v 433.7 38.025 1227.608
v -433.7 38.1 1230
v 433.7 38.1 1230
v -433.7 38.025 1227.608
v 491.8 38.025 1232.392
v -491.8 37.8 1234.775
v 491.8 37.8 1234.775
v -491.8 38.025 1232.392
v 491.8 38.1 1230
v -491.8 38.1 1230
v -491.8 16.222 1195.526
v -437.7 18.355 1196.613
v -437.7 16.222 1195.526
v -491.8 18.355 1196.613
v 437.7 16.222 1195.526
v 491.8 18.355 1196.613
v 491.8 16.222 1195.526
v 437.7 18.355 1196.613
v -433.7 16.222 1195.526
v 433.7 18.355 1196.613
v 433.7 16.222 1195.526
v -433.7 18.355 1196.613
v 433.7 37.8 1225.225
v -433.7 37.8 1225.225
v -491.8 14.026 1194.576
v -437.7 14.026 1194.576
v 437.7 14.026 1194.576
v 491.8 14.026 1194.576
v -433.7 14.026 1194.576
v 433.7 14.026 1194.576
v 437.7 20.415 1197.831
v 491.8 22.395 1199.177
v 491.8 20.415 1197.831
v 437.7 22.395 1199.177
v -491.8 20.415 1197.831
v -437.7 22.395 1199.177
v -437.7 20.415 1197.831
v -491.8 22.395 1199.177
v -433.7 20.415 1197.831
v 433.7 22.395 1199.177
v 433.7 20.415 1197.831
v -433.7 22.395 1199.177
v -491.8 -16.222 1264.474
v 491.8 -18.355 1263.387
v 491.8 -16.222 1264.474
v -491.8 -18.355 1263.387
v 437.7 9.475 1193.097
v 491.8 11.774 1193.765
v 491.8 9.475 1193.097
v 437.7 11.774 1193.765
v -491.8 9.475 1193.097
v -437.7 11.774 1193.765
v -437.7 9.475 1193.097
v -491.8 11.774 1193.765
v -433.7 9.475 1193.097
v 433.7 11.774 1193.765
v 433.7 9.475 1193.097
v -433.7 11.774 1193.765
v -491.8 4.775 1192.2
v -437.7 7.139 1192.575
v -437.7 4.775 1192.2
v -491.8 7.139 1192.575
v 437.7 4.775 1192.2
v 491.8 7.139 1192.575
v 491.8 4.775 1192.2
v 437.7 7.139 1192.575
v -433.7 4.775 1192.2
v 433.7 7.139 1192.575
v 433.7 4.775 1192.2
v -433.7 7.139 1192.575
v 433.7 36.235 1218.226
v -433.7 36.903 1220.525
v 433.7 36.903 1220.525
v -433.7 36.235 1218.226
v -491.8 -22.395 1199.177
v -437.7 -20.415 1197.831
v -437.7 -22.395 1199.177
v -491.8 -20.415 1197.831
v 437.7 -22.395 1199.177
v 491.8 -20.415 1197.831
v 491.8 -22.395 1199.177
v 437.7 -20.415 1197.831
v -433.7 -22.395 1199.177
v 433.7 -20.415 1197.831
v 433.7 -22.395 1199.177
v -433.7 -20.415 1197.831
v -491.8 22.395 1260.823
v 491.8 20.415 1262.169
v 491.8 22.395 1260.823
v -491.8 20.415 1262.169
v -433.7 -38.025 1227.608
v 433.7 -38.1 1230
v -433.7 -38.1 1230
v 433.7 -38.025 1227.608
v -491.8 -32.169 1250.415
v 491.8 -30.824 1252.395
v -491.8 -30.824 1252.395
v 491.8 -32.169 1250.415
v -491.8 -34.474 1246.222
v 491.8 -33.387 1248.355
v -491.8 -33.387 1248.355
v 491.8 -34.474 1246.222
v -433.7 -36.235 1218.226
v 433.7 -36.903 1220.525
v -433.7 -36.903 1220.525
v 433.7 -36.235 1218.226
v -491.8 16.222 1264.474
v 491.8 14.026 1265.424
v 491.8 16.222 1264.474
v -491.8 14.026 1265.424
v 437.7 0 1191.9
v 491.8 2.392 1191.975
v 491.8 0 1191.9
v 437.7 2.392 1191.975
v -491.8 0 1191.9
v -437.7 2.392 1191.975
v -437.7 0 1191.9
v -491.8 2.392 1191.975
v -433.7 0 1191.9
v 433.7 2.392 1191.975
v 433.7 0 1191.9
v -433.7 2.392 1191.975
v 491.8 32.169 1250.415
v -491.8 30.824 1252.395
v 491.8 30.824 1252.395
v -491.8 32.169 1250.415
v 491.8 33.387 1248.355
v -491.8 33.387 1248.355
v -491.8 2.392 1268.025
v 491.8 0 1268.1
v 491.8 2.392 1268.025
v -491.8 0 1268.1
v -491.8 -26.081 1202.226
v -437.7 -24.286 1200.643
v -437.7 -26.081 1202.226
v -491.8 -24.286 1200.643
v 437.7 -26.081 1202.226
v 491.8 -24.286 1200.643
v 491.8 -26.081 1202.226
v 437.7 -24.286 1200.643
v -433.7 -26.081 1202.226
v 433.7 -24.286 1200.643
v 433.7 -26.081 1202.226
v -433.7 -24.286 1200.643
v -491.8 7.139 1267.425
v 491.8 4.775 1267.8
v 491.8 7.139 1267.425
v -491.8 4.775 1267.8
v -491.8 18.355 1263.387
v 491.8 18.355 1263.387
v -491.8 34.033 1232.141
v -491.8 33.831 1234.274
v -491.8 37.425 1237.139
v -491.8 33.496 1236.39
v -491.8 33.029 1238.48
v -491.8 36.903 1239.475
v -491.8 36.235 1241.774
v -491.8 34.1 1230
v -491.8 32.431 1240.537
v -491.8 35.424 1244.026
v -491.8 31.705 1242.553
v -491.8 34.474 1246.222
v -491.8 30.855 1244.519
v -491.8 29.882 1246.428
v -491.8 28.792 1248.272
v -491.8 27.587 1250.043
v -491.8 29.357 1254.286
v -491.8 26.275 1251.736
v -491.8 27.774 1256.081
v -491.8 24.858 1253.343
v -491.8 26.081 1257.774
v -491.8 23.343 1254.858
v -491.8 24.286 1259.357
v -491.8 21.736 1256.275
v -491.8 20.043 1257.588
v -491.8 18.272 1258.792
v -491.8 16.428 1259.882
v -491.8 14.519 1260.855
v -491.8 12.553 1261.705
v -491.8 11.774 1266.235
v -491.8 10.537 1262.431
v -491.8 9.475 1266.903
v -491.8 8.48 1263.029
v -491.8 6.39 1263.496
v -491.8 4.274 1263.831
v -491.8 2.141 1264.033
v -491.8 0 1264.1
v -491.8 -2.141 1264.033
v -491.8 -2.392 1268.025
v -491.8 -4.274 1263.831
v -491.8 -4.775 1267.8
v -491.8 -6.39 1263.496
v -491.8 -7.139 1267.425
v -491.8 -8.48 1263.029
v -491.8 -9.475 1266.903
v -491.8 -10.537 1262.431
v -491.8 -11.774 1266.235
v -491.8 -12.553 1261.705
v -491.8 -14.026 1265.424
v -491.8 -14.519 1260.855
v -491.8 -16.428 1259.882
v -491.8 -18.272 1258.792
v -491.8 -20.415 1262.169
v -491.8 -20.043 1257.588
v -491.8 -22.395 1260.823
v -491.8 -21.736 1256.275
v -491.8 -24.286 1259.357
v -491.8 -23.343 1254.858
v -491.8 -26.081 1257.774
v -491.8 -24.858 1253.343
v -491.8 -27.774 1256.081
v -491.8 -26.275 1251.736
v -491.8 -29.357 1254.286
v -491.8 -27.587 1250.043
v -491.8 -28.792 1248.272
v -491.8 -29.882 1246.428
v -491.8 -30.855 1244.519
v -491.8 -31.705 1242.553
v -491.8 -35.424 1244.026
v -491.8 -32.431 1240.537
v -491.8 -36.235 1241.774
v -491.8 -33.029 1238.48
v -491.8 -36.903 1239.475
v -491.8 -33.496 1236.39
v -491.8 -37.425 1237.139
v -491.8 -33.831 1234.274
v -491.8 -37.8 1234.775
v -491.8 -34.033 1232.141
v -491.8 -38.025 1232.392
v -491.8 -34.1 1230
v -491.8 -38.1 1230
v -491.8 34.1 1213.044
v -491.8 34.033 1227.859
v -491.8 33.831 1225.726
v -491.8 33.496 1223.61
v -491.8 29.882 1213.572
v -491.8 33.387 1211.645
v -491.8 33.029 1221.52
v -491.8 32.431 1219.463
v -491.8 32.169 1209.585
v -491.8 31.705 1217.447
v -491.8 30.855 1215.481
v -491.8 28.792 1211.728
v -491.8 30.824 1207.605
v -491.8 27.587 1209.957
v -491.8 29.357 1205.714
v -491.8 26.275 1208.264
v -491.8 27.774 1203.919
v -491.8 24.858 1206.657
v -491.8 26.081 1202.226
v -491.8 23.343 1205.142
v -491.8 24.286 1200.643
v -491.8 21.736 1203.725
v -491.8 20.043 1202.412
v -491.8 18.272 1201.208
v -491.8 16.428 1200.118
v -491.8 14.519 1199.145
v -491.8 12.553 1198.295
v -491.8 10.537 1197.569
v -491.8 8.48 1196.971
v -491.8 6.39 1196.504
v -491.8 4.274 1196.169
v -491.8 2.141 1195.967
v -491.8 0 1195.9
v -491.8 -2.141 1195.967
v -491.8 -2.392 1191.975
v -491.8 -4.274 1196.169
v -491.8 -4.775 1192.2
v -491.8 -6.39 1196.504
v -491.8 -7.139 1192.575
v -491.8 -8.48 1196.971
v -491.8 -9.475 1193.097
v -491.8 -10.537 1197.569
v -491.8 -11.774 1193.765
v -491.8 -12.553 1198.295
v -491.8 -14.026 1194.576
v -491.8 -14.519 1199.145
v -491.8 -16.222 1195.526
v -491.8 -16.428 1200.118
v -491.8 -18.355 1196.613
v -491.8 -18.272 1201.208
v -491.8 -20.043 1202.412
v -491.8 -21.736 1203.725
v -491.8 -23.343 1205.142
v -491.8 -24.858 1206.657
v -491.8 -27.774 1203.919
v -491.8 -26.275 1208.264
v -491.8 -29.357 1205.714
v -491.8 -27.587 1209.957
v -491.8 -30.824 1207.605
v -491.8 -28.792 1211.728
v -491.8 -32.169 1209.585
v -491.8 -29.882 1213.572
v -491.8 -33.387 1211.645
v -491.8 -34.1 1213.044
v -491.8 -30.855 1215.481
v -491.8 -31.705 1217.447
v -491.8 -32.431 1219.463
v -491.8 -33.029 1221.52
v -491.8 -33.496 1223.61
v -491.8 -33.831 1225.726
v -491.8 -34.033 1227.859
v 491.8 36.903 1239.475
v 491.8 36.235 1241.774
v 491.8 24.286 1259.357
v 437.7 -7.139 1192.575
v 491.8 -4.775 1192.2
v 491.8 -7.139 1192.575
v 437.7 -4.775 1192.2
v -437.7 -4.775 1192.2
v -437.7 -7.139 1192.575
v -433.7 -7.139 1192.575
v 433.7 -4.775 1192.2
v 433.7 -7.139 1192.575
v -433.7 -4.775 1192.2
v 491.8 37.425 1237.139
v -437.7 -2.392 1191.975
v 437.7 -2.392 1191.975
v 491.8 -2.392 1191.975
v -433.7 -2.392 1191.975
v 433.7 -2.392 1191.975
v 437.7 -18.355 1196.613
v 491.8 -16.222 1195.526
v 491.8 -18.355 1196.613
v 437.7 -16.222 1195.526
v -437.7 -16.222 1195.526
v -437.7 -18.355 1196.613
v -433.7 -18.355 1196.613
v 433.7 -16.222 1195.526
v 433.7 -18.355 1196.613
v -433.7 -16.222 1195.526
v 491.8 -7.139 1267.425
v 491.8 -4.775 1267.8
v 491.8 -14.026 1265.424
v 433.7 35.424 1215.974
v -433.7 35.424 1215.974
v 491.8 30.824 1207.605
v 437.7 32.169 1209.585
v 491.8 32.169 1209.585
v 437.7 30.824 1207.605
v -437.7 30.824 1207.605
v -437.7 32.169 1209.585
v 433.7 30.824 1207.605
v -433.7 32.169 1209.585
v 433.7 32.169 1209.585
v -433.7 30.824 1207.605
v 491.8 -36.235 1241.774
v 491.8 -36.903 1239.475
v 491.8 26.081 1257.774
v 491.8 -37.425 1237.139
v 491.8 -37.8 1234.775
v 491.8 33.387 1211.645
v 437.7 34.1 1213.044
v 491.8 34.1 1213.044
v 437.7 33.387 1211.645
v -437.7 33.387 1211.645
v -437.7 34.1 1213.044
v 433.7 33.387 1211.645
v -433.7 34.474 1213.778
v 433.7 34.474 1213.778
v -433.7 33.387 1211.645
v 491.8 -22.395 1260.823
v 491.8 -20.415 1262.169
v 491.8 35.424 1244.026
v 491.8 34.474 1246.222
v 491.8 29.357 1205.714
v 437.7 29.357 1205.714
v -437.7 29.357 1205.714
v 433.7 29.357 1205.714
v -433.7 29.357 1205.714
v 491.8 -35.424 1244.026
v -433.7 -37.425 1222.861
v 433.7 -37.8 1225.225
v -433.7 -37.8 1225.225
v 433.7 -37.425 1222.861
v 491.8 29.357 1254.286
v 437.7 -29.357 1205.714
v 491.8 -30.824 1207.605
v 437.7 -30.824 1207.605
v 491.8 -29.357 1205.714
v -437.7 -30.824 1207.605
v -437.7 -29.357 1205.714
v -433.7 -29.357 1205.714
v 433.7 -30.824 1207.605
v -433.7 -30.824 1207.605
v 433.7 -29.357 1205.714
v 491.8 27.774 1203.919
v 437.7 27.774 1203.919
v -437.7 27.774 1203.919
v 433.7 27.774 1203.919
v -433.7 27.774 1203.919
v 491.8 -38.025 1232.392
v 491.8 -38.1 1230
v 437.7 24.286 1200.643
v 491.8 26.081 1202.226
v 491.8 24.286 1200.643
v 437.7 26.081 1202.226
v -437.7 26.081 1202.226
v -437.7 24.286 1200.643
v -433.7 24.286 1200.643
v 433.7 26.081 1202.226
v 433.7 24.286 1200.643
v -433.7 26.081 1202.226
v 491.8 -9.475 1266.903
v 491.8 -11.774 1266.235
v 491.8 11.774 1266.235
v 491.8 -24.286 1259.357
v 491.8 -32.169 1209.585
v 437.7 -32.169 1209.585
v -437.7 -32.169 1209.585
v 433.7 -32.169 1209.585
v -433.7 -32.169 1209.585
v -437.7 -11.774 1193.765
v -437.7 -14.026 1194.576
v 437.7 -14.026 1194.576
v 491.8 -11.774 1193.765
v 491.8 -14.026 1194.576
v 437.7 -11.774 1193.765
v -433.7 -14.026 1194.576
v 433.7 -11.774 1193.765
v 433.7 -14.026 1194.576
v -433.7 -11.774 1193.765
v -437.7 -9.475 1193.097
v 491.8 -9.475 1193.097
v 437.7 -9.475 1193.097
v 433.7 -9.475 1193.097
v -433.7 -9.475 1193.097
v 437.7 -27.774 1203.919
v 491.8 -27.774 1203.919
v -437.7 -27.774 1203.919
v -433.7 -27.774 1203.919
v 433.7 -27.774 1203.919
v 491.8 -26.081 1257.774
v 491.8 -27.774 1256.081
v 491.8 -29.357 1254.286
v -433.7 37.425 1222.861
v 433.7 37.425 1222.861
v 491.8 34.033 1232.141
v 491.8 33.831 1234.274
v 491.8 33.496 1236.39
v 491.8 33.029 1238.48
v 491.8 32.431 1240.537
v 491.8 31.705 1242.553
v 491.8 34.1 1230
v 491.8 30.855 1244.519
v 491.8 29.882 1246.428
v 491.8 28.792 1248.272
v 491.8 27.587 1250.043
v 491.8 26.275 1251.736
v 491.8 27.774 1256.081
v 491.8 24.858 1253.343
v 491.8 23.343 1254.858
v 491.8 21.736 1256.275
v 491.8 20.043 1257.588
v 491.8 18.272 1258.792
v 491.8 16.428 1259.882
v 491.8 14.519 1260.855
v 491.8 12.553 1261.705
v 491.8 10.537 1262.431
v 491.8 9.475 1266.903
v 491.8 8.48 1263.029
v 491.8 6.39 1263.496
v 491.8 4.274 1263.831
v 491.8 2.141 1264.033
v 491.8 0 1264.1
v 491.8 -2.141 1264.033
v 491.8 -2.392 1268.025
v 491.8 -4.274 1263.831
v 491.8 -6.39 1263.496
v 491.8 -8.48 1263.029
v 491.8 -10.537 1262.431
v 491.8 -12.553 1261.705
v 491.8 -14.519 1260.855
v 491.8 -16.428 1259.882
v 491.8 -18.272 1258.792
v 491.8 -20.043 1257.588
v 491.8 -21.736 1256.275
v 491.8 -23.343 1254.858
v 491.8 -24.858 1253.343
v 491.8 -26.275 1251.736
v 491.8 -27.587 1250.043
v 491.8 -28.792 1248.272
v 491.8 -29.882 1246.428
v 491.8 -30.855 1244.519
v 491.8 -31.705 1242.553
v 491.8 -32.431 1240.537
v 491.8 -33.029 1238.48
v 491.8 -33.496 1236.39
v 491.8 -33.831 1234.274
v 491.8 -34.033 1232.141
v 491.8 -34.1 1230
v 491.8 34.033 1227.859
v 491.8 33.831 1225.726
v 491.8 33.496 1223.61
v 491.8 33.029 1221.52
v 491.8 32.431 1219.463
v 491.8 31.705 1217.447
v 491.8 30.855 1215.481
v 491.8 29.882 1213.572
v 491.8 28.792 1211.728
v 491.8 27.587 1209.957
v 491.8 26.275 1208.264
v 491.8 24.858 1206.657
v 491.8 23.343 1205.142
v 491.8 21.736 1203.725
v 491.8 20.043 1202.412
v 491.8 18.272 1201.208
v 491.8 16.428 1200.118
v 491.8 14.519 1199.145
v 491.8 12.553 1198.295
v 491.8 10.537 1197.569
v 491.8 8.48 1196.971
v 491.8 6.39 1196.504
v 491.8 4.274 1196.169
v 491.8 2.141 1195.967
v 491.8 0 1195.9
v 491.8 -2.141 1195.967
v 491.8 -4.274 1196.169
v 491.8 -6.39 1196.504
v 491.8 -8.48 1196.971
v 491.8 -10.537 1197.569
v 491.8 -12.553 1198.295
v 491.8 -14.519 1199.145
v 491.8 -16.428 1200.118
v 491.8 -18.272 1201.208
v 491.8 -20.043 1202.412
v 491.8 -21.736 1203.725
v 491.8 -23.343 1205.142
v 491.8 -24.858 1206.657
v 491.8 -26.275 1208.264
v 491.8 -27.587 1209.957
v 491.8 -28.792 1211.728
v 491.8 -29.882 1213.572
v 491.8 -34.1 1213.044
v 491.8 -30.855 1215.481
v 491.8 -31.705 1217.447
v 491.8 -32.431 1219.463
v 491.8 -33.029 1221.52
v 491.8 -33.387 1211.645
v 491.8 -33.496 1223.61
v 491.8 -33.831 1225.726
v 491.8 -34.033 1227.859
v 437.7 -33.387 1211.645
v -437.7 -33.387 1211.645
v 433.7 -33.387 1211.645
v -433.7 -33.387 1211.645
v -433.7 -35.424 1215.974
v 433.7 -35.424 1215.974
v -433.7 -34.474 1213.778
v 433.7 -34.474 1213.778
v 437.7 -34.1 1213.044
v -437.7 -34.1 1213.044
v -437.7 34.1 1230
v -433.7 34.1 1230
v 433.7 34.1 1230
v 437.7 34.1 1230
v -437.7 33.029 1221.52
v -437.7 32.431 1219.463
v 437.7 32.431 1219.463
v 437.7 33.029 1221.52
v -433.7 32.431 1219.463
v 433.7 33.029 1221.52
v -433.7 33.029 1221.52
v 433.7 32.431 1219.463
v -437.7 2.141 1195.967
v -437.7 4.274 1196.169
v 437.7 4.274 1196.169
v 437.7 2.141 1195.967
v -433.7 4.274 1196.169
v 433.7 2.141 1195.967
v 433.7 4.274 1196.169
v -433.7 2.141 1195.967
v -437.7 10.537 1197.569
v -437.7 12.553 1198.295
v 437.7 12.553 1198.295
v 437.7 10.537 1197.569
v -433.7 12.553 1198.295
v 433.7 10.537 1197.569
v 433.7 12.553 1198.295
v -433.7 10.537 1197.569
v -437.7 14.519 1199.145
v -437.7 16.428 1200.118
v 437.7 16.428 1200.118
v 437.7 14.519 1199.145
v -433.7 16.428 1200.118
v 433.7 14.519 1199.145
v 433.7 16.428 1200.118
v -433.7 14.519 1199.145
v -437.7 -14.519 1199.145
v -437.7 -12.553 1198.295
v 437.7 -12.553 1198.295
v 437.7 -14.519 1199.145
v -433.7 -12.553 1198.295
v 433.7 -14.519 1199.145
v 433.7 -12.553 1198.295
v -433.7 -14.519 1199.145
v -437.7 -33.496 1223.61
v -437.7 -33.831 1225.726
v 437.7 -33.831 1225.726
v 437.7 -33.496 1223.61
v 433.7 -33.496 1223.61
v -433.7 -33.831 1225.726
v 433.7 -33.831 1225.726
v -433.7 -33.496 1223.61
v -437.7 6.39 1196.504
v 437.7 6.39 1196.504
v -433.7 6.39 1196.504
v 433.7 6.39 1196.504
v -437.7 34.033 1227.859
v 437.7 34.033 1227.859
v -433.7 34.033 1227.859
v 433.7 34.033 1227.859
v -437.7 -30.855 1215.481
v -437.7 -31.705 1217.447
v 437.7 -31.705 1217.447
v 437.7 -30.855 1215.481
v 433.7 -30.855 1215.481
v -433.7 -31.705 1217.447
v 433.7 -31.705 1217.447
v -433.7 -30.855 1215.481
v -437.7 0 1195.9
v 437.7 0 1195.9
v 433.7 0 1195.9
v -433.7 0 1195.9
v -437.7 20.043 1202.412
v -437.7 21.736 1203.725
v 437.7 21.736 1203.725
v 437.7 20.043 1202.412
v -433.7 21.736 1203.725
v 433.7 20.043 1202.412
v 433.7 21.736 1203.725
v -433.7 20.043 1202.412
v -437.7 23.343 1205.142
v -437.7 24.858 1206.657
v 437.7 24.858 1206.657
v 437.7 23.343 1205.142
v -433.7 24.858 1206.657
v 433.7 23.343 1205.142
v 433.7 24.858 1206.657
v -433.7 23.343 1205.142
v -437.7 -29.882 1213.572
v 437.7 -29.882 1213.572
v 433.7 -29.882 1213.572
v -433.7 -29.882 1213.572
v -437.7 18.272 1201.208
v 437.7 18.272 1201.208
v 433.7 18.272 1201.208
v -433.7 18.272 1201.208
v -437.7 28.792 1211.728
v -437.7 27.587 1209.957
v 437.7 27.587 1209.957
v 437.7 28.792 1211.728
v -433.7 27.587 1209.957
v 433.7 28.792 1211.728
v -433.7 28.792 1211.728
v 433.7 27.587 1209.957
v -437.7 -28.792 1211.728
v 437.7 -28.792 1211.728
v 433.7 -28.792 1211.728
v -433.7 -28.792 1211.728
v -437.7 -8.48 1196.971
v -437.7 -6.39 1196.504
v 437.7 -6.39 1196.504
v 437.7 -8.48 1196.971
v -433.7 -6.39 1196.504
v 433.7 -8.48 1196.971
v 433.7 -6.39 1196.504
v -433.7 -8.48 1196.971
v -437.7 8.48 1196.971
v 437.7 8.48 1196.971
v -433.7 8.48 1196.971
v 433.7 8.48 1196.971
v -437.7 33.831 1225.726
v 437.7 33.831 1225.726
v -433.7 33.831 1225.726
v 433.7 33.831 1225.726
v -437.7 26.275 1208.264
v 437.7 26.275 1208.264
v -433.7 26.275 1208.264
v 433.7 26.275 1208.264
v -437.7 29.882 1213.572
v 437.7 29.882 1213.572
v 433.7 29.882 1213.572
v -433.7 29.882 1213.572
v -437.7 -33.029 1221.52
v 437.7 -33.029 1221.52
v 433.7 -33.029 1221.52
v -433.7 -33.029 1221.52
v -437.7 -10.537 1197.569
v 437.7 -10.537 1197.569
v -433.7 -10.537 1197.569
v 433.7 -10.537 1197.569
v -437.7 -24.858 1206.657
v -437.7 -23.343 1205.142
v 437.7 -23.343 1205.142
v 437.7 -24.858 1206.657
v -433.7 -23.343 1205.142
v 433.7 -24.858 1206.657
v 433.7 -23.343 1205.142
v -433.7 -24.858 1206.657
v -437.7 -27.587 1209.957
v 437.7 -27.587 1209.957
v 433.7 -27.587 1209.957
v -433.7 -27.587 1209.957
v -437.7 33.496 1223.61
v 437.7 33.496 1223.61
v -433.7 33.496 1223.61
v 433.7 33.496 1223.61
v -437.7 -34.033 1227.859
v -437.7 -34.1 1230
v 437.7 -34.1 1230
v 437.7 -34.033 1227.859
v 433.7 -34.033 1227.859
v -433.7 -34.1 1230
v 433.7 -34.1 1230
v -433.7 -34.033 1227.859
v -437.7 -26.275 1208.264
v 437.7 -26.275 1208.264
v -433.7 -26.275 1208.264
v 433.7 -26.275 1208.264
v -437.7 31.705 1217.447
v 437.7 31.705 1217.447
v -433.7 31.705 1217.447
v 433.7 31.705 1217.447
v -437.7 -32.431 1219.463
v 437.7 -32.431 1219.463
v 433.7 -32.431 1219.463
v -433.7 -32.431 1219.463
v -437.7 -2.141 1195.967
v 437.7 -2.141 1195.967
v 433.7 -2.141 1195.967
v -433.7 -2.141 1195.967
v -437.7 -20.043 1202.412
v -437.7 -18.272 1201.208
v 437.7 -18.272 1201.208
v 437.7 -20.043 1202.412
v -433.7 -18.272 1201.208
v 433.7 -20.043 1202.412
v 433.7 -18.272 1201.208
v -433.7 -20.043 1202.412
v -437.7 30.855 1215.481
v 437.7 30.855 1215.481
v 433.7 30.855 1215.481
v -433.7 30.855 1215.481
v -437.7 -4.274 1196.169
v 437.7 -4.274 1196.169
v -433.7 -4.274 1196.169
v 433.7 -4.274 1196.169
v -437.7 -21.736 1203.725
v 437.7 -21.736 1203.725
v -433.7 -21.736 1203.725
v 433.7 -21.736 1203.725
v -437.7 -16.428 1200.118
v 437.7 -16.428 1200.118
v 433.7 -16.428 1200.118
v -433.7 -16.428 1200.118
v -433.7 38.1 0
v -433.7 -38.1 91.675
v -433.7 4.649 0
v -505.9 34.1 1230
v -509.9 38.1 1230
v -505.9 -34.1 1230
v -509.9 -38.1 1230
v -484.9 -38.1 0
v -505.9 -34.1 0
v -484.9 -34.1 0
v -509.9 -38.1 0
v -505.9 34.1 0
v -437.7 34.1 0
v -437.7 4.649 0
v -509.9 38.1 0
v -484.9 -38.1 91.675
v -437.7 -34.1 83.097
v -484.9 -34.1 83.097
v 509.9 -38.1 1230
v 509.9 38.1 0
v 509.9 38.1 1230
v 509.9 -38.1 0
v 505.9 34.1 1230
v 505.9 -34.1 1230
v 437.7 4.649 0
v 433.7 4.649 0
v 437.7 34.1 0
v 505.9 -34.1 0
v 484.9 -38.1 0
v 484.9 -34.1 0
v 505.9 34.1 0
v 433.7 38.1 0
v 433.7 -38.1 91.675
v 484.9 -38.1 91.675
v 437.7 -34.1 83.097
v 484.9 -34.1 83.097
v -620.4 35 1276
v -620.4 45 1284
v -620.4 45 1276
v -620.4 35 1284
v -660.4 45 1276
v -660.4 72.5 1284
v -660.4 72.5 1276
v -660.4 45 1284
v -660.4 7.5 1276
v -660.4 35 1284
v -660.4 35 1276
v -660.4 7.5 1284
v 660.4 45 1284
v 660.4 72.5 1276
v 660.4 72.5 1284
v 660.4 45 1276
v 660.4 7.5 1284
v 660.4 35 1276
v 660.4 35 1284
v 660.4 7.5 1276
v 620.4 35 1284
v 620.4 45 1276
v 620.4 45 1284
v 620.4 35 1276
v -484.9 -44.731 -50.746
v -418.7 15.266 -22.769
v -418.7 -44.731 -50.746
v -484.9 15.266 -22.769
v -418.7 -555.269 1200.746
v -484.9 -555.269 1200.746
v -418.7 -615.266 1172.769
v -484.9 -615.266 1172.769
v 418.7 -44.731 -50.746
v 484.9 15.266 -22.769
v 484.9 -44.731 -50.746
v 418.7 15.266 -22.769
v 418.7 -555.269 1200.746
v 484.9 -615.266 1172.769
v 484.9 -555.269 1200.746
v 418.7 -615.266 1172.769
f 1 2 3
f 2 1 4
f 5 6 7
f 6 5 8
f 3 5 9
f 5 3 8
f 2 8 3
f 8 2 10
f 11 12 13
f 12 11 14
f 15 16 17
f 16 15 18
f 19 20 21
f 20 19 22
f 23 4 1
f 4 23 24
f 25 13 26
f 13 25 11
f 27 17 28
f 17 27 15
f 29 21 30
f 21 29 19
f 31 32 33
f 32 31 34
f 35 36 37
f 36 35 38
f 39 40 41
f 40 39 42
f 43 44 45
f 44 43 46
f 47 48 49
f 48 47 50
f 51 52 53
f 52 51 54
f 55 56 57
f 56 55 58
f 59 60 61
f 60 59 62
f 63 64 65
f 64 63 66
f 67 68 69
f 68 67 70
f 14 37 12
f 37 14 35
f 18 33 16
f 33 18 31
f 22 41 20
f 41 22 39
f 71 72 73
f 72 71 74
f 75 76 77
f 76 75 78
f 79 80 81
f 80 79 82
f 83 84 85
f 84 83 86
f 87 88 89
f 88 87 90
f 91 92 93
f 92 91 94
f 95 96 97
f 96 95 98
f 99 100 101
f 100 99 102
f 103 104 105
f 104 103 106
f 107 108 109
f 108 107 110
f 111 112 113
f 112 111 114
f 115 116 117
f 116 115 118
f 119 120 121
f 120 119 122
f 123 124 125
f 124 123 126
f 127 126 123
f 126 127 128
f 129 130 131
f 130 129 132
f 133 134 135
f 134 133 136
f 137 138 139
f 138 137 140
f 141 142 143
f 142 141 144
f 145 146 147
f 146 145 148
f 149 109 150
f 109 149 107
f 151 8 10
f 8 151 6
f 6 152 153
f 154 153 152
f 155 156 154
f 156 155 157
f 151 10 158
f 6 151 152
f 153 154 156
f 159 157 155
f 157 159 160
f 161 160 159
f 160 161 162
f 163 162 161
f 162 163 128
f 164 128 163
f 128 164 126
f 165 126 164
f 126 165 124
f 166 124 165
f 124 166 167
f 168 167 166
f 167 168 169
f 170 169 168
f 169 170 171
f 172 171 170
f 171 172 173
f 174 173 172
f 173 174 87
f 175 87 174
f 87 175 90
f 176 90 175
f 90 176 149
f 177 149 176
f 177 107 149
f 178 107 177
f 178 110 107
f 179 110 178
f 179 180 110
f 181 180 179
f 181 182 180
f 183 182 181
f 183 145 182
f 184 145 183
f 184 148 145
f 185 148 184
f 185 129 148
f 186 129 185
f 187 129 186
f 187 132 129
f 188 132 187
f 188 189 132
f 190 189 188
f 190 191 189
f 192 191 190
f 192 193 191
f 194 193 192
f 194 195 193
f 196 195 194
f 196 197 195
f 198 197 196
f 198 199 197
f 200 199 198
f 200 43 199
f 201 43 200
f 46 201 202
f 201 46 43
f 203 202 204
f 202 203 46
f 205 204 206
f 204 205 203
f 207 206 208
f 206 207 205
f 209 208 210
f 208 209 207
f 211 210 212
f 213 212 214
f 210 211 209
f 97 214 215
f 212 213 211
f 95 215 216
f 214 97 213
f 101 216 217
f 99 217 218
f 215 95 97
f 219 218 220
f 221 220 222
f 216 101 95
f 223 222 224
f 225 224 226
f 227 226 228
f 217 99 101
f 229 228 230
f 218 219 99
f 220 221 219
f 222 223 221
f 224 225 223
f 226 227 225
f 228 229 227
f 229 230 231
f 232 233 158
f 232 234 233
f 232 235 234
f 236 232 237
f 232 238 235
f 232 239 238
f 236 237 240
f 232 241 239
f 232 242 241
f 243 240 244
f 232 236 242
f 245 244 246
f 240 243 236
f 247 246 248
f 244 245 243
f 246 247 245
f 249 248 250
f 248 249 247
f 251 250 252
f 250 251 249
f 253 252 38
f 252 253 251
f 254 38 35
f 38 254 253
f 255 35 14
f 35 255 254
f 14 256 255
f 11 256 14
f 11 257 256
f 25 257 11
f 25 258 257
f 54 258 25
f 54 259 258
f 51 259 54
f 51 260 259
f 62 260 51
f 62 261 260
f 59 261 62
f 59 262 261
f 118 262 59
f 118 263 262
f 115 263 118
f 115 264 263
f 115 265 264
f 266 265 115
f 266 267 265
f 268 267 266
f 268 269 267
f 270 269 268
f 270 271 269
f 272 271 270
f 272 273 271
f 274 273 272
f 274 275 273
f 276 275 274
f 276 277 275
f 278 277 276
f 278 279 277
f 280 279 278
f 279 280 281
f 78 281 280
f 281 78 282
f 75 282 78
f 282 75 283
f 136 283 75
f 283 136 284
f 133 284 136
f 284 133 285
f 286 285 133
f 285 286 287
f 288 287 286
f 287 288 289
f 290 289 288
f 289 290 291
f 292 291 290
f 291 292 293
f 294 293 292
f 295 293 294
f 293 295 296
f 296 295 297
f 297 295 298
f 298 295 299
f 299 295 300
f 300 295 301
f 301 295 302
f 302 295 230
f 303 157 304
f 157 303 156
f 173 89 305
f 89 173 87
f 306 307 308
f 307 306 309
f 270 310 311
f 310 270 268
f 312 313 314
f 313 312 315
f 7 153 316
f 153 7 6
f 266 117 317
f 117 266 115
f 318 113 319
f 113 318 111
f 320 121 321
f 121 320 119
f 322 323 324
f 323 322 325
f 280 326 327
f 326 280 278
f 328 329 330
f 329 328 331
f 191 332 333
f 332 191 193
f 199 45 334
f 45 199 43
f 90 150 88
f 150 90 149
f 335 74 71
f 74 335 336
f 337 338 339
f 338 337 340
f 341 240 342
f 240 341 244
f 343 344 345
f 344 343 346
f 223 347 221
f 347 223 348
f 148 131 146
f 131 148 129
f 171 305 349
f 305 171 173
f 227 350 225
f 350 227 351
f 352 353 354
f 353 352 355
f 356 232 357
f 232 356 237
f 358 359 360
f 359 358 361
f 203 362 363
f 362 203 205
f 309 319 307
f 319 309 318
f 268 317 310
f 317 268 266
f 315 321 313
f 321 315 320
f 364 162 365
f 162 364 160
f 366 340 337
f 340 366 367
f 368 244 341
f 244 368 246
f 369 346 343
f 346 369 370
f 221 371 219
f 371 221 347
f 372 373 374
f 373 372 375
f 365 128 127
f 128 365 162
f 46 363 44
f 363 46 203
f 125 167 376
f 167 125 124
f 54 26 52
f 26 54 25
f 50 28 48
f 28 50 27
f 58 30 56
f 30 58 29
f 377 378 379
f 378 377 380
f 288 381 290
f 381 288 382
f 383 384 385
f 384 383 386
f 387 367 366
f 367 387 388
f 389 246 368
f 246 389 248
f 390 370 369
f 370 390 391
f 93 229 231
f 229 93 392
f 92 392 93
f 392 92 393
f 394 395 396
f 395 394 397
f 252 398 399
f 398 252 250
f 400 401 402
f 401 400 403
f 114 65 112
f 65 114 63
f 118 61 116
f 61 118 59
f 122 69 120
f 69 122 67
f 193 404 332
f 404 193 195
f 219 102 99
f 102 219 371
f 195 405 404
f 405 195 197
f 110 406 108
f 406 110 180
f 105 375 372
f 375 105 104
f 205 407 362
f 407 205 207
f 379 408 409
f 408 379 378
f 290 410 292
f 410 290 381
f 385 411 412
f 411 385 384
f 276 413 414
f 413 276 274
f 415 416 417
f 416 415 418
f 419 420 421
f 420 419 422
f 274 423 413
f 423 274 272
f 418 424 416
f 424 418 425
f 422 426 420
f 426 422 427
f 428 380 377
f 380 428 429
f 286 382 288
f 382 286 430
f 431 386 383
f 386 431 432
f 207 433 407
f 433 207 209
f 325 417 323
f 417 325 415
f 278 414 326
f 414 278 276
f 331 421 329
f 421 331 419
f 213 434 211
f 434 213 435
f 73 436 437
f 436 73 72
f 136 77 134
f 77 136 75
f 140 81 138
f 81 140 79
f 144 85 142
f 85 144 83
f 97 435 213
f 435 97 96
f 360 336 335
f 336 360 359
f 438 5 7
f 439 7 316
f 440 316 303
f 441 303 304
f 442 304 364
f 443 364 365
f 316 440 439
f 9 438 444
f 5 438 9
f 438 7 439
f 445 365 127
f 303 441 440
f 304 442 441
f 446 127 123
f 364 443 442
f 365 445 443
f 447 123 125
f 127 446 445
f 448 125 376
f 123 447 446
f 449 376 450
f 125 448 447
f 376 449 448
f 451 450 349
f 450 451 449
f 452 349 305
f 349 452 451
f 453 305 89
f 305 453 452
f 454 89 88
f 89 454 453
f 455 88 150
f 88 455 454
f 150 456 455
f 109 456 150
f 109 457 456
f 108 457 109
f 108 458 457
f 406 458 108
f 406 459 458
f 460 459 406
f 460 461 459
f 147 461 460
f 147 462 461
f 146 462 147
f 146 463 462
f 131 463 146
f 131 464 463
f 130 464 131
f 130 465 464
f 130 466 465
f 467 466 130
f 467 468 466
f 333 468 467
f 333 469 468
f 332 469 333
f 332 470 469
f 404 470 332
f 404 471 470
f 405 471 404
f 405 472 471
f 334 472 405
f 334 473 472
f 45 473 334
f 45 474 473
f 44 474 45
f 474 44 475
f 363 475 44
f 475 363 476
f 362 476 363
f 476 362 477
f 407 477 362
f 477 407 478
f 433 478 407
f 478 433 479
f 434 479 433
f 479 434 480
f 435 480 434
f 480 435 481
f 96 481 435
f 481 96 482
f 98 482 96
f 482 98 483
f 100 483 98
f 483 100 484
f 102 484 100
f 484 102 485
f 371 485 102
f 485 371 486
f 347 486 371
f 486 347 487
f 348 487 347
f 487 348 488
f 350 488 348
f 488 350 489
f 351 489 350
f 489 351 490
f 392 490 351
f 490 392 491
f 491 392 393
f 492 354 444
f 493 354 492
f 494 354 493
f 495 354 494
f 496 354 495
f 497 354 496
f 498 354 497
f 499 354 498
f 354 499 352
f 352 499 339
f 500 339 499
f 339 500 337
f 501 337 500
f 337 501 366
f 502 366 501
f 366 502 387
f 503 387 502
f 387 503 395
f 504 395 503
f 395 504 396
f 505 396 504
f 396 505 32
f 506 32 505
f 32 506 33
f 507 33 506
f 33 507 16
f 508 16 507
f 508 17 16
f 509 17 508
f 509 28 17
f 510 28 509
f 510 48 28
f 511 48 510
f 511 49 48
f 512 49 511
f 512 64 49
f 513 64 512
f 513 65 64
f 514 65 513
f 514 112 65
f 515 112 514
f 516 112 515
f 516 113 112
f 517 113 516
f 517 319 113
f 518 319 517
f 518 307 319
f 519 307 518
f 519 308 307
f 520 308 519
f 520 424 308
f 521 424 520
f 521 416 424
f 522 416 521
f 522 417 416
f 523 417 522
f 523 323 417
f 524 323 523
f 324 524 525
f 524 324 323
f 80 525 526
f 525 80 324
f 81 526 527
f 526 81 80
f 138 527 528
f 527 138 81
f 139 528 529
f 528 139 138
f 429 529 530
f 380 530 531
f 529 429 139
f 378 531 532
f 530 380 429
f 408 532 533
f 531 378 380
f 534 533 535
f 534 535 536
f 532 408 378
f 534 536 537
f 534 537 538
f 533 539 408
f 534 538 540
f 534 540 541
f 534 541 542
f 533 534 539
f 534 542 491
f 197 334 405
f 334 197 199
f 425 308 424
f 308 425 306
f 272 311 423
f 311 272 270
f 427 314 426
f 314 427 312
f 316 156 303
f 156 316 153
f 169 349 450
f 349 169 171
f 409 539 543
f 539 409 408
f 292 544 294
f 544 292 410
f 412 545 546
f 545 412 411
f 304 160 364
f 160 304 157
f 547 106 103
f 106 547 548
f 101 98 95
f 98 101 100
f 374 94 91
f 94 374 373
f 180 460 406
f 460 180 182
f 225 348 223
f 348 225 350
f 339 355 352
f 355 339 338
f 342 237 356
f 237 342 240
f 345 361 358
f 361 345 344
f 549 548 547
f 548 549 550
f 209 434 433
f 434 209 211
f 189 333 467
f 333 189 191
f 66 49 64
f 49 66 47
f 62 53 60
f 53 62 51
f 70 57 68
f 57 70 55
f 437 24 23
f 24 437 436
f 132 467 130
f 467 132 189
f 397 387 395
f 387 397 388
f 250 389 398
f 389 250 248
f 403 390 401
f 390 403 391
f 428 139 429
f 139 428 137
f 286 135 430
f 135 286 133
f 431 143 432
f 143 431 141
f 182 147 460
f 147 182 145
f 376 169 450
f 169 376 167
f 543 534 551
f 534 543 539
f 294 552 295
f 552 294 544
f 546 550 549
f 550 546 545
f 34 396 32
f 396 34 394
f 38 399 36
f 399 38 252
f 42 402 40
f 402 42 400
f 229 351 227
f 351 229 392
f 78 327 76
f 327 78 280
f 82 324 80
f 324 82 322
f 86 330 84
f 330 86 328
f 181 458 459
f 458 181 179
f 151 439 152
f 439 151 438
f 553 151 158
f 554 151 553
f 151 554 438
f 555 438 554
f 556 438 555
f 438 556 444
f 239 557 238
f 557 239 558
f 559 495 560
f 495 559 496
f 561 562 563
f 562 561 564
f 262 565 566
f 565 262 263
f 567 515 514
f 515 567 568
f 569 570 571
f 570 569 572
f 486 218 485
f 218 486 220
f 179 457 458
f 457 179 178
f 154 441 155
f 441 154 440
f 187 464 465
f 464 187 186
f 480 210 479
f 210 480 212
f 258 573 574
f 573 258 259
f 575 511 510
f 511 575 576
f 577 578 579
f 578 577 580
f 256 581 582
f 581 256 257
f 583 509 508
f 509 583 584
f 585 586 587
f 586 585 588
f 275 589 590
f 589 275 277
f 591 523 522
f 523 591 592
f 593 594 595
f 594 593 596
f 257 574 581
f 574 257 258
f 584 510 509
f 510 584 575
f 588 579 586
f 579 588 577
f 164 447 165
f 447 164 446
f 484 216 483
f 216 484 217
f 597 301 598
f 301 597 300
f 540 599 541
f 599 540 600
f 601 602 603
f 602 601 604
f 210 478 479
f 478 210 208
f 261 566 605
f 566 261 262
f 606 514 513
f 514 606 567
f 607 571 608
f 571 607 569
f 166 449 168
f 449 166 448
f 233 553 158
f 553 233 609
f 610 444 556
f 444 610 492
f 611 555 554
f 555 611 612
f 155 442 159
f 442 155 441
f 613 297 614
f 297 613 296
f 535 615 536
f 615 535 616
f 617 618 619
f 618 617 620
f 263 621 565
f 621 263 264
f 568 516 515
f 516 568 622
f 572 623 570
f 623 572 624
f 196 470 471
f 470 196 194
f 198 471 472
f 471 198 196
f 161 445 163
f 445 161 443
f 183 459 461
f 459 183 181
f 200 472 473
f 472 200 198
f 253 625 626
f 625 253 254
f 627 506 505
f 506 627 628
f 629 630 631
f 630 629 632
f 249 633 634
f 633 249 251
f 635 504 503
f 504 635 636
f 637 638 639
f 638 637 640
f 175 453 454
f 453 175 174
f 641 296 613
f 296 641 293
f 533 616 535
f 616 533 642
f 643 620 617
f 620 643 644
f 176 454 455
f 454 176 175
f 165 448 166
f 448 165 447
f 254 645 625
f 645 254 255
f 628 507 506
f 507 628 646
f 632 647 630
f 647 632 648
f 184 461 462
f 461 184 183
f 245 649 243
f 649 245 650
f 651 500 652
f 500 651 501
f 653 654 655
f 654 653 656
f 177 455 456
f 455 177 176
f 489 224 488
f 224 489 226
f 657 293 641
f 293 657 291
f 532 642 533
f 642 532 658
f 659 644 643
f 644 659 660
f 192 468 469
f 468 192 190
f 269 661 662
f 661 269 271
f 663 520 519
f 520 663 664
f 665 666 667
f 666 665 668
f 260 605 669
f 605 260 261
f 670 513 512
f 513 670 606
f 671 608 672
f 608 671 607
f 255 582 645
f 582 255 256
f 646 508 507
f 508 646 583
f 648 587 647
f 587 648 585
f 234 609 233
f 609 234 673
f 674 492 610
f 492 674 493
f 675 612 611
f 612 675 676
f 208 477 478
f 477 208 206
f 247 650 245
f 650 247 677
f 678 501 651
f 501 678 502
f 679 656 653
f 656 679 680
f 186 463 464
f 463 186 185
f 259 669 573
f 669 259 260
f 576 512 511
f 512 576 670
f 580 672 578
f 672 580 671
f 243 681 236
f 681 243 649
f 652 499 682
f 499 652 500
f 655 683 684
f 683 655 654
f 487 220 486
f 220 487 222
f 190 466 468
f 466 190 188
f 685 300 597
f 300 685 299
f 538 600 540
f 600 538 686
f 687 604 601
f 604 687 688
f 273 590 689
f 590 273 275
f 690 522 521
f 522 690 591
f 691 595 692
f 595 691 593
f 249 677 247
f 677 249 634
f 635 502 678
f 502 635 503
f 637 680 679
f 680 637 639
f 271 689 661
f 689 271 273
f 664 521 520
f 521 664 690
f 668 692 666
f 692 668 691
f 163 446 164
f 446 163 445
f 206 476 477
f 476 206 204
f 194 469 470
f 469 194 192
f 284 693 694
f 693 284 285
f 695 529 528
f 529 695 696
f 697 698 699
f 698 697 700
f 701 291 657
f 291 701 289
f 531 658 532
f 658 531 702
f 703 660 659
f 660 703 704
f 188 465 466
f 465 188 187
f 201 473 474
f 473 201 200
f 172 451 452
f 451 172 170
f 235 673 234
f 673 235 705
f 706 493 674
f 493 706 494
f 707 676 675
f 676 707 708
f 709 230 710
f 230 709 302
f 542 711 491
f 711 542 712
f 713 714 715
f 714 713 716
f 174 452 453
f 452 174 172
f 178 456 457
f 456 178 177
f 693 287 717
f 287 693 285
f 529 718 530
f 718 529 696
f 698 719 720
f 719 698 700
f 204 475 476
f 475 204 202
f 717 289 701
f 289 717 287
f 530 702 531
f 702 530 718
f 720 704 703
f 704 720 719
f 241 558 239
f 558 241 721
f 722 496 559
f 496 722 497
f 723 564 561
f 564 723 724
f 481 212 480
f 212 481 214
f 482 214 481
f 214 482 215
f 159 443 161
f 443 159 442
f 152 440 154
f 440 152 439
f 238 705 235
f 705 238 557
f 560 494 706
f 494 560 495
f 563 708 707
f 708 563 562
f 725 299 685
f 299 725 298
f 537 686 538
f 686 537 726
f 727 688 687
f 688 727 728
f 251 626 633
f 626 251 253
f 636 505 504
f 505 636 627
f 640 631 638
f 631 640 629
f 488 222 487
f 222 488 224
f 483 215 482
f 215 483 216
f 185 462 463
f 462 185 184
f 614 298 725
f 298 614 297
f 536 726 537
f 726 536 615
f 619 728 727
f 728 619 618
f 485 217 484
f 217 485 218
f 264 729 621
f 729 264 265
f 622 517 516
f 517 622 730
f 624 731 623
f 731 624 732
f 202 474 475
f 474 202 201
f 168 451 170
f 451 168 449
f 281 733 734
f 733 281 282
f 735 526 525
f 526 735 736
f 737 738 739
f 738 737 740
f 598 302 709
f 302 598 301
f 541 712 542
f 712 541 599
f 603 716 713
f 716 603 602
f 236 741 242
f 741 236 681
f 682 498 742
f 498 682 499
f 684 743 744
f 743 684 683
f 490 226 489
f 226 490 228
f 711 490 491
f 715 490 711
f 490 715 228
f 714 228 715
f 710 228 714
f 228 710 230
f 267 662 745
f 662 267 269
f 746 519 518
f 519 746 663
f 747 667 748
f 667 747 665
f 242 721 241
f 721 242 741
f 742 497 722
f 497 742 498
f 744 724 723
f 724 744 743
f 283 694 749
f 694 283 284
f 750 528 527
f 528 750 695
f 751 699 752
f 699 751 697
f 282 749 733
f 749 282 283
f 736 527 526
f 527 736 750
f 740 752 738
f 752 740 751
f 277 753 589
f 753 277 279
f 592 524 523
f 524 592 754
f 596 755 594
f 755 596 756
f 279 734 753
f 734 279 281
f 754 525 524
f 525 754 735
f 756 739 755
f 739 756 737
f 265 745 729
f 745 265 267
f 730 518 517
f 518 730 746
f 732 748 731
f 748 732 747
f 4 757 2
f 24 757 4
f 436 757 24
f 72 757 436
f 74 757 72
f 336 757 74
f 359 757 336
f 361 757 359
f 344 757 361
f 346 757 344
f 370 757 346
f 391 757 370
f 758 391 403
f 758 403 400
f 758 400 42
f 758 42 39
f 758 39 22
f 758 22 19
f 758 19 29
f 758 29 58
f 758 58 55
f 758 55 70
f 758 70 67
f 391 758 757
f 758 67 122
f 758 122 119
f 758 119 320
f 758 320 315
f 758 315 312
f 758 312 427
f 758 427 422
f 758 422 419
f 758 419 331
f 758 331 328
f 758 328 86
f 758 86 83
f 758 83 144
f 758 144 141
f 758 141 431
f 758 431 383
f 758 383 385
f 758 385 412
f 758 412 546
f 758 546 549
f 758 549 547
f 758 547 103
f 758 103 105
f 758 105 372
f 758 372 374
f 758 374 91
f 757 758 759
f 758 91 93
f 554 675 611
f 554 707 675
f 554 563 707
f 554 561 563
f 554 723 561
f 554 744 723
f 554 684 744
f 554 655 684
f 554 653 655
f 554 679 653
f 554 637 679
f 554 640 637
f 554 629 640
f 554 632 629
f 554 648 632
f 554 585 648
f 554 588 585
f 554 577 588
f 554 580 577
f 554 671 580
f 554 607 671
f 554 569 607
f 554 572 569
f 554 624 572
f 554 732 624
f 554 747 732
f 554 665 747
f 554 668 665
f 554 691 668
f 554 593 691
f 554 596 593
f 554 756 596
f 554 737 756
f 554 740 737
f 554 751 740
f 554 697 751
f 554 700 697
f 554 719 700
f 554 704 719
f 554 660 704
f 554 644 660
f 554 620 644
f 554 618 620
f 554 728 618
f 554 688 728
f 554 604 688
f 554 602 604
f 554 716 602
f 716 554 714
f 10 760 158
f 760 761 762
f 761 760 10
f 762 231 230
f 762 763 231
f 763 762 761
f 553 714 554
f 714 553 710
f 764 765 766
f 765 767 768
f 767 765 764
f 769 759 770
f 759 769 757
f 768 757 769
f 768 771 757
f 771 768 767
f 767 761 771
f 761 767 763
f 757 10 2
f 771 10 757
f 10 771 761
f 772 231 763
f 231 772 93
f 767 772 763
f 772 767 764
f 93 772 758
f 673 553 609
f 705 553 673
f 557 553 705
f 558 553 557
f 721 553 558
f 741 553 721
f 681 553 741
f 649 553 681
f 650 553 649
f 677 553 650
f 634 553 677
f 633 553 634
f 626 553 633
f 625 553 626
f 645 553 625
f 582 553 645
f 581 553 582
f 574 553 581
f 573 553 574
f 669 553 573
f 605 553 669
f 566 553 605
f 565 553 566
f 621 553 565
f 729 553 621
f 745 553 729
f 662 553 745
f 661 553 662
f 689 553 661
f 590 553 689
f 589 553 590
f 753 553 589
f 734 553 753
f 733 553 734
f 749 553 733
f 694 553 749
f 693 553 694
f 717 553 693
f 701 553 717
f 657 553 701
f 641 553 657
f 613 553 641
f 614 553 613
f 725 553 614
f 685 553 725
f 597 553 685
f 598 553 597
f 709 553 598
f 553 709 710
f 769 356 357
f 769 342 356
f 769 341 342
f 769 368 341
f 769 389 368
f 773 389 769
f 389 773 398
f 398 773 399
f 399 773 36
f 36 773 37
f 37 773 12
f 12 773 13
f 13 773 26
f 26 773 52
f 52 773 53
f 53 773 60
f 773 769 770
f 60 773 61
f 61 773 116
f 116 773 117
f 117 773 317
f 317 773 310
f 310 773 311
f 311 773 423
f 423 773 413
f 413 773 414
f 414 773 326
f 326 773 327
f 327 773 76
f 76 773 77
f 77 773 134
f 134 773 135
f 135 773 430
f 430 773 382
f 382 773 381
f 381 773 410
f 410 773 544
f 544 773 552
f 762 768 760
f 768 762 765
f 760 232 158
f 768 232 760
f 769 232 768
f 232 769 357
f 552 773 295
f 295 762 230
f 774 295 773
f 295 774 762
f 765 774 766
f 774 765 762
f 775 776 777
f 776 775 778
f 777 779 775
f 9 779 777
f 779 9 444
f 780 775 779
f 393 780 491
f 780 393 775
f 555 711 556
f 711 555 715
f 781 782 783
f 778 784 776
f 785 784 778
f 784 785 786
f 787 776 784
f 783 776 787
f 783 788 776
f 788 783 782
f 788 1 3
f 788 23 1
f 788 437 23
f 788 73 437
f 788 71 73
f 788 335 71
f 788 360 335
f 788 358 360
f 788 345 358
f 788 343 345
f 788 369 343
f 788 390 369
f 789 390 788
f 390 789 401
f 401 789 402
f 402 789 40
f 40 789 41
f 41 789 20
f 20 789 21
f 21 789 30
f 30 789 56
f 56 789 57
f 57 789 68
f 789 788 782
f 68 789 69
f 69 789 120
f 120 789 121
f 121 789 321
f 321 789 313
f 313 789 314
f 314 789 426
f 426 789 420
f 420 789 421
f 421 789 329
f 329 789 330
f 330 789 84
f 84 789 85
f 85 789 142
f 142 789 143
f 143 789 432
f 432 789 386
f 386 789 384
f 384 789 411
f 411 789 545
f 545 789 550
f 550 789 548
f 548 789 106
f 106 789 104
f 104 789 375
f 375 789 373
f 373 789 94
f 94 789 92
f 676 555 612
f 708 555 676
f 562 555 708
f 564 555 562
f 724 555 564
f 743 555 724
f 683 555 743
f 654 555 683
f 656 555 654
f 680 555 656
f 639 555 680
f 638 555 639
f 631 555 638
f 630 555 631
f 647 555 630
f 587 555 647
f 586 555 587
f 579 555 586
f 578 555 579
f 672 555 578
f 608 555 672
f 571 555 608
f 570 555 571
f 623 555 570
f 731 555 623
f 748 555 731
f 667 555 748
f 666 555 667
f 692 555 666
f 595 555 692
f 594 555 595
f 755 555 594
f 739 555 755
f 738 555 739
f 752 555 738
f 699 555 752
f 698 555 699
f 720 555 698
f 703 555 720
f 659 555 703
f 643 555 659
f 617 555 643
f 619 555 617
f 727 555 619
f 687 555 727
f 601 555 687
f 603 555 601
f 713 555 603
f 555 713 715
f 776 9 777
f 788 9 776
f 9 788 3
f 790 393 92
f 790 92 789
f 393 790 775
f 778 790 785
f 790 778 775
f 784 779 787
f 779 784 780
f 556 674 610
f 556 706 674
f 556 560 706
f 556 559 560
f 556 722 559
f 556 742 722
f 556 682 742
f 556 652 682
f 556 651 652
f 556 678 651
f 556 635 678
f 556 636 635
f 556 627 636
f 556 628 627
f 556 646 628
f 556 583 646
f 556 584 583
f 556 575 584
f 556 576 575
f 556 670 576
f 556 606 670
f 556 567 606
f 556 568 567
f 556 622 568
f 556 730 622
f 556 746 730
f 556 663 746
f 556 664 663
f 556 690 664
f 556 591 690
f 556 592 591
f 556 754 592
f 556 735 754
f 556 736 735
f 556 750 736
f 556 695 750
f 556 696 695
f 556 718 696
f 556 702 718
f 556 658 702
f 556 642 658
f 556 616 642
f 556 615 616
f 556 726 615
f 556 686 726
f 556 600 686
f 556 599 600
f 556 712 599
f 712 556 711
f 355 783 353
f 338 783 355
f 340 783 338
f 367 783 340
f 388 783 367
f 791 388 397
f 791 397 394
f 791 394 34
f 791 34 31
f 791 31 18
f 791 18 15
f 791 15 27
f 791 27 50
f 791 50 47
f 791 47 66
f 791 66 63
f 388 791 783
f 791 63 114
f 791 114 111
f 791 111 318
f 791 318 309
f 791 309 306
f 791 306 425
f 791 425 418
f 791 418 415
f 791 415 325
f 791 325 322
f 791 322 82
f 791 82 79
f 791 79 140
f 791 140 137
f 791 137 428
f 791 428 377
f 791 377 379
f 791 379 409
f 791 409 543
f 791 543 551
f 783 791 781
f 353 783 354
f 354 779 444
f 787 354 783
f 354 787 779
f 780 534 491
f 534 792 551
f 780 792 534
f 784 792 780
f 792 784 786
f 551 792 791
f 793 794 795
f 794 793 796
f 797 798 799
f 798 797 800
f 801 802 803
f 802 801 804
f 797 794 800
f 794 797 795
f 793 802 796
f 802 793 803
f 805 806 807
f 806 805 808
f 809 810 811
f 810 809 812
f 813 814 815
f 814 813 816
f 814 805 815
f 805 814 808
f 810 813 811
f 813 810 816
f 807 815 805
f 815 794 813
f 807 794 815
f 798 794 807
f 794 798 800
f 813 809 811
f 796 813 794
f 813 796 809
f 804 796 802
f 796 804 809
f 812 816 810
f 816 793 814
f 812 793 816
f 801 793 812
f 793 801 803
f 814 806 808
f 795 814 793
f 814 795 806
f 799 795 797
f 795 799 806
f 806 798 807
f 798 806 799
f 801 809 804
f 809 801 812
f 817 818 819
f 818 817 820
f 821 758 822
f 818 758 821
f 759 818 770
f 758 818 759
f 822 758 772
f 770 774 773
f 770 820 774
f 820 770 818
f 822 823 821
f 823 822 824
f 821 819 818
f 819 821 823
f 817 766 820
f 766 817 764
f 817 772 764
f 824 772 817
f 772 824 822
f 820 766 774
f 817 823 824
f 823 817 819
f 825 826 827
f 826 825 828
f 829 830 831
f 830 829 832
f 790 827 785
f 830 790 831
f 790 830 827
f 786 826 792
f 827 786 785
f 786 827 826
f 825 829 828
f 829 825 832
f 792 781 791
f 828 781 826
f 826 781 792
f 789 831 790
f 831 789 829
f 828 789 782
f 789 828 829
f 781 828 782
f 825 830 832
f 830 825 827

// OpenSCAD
// ====================================================================================
// REVOLUTIONARY TECHNOLOGY COMPANY & UNIVERSITY OF WASHINGTON DEPARTMENT OF PHYSICS
// Subsystem: silverado_md_chase_rack.scad (Over-Cab Torsional Chase Rack Matrix)
// Core Application: 2027-2028 Silverado MD Frame-Anchored Off-Road Roll Bar Cage
// Center Origin (0,0,0) = Mid-point of Cab-to-Axle Front Structural Frame Mating Line
// ====================================================================================

$fn = 100; // High-precision CNC mandrel tube-bending rendering resolution

// --- Commercial Fleet Chase Rack Constants (mm) ---
inch_to_mm          = 25.4;
frame_rail_spacing  = 34.0  * inch_to_mm; // 863.60 mm standard straight truck width [INDEX]
tube_diameter_mm    = 76.20;              // Heavy-duty 3-inch mandrel-bent structural safety tubing
cab_roof_height_mm  = 1150.00;            // Elevation height of the armored cab skin apex [INDEX]
lightbar_mount_w    = 52.0  * inch_to_mm; // Sized for standard 52" off-road LED light bars

module primary_overcab_hoop() {
    echo("COMPILING CHASSIS-INTEGRATED OVER-CAB ROLL BAR HOOP AND CHASE CONSOLE");
    // Main vertical U-shaped structural rollover hoop projecting higher than the cab roof
    color("DimGrey") {
        translate([0, 0, cab_roof_height_mm + 80]) { // 80mm higher than the truck cab profile
            rotate([90, 0, 90]) {
                difference() {
                    // Outer structural tube diameter
                    cylinder(d=tube_diameter_mm, h=frame_rail_spacing + 120, center=true);
                    // Internal hollow core wall thickness tracking line
                    cylinder(d=tube_diameter_mm - 8, h=frame_rail_spacing + 126, center=true);
                }
            }
        }
        
        // Left and Right main vertical support down-legs anchoring to the frame rails [INDEX]
        for (side = [-1, 1]) {
            translate([side * (frame_rail_spacing/2 + 40), 0, (cab_roof_height_mm + 80)/2])
                difference() {
                    cube([tube_diameter_mm, tube_diameter_mm, cab_roof_height_mm + 80], center=true);
                    cube([tube_diameter_mm - 8, tube_diameter_mm - 8, cab_roof_height_mm + 88], center=true);
                }
        }
    }
}

module over_roof_lightbar_flange() {
    // Rigid horizontal mounting tray positioned at the absolute peak of the roll bar loop
    color("Silver") {
        translate([0, 40, cab_roof_height_mm + 130]) {
            difference() {
                // Flat structural aluminum attachment base plate
                cube([lightbar_mount_w, 65, 8.0], center=true);
                
                // Multi-point radial slotted holes to accept adjustable off-road brackets
                for (side = [-1, 1]) {
                    translate([side * (lightbar_mount_w/2 - 20), 0, 0])
                        cube([40, 10, 12], center=true);
                }
            }
        }
    }
}

module triangulated_frame_kickbraces() {
    // Angled heavy structural stabilizing sails passing straight through the cab portals to tie load
    color("DarkSlateGrey") {
        for (side = [-1, 1]) {
            translate([side * (frame_rail_spacing/2 + 20), -300, cab_roof_height_mm/2])
                rotate([25, 0, 0]) // 25-degree backward lean stabilization axis
                    cube([tube_diameter_mm - 10, tube_diameter_mm - 10, cab_roof_height_mm + 200], center=true);
        }
    }
}

// --- Composite Structural Chase Rack Instantiation ---
union() {
    primary_overcab_hoop();
    over_roof_lightbar_flange();
    triangulated_frame_kickbraces();
}
